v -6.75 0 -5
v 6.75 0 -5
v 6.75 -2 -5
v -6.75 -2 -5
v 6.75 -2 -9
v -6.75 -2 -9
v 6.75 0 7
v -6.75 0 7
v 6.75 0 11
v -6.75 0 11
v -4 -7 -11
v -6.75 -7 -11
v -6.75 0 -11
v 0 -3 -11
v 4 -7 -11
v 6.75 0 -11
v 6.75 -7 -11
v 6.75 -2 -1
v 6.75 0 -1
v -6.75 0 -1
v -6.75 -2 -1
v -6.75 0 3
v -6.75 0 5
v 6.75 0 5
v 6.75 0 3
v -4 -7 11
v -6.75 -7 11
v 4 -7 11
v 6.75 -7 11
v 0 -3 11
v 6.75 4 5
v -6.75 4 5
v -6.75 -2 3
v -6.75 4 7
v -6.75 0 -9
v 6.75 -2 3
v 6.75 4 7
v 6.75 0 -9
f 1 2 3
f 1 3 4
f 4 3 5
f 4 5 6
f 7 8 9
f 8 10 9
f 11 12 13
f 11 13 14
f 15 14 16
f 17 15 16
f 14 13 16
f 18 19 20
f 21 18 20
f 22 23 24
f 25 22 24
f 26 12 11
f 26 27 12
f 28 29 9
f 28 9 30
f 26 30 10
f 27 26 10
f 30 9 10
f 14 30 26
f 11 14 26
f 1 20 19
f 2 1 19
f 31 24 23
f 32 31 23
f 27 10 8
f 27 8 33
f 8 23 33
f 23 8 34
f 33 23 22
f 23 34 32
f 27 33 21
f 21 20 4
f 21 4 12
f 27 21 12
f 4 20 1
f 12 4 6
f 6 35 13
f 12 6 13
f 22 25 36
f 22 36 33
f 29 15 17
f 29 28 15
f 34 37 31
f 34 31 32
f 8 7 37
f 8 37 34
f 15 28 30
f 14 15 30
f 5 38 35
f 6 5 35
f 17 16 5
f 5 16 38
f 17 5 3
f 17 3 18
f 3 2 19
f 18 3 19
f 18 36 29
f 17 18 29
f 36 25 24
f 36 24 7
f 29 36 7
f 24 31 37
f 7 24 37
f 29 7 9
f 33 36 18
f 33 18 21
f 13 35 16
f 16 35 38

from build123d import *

# Parameters (mm, degrees)
F1_DEPTH = 7
F2_W     = 13.5
F2_H     = 2
F3_DEPTH = 4
F5_DEPTH = 22
F6_W     = 13.5
F6_H     = 4
F7_DEPTH = 2


with BuildPart() as f1:
    # F0 (on Front) → F1 (new body)
    with BuildSketch(Plane.XZ):
        Polygon((6.75, -11), (6.75, -9), (6.75, 9), (6.75, 11), (-6.75, 11), (-6.75, 9), (-6.75, -9), (-6.75, -11), align=None)
    extrude(amount=F1_DEPTH)

    # F2 (on face) → F3 (join)
    with BuildSketch(Plane(origin=(0, 0, 0), x_dir=(-1, 0, 0), z_dir=(0, 1, 0))):
        with Locations((0, 6)):
            Rectangle(F2_W, F2_H)
    extrude(amount=F3_DEPTH)

    # F4 (on face) → F5 (cut, through all)
    with BuildSketch(Plane.XY.offset(11)):
        Polygon((4, -7), (0, -3), (-4, -7), align=None)
    extrude(amount=-F5_DEPTH, mode=Mode.SUBTRACT)

    # F6 (on face) → F7 (cut)
    with BuildSketch(Plane(origin=(0, 0, 0), x_dir=(-1, 0, 0), z_dir=(0, 1, 0))):
        with Locations((0, 1)):
            Rectangle(F6_W, F6_H)
        with Locations((0, -7)):
            Rectangle(F6_W, F6_H)
    extrude(amount=-F7_DEPTH, mode=Mode.SUBTRACT)


solid = f1.part
